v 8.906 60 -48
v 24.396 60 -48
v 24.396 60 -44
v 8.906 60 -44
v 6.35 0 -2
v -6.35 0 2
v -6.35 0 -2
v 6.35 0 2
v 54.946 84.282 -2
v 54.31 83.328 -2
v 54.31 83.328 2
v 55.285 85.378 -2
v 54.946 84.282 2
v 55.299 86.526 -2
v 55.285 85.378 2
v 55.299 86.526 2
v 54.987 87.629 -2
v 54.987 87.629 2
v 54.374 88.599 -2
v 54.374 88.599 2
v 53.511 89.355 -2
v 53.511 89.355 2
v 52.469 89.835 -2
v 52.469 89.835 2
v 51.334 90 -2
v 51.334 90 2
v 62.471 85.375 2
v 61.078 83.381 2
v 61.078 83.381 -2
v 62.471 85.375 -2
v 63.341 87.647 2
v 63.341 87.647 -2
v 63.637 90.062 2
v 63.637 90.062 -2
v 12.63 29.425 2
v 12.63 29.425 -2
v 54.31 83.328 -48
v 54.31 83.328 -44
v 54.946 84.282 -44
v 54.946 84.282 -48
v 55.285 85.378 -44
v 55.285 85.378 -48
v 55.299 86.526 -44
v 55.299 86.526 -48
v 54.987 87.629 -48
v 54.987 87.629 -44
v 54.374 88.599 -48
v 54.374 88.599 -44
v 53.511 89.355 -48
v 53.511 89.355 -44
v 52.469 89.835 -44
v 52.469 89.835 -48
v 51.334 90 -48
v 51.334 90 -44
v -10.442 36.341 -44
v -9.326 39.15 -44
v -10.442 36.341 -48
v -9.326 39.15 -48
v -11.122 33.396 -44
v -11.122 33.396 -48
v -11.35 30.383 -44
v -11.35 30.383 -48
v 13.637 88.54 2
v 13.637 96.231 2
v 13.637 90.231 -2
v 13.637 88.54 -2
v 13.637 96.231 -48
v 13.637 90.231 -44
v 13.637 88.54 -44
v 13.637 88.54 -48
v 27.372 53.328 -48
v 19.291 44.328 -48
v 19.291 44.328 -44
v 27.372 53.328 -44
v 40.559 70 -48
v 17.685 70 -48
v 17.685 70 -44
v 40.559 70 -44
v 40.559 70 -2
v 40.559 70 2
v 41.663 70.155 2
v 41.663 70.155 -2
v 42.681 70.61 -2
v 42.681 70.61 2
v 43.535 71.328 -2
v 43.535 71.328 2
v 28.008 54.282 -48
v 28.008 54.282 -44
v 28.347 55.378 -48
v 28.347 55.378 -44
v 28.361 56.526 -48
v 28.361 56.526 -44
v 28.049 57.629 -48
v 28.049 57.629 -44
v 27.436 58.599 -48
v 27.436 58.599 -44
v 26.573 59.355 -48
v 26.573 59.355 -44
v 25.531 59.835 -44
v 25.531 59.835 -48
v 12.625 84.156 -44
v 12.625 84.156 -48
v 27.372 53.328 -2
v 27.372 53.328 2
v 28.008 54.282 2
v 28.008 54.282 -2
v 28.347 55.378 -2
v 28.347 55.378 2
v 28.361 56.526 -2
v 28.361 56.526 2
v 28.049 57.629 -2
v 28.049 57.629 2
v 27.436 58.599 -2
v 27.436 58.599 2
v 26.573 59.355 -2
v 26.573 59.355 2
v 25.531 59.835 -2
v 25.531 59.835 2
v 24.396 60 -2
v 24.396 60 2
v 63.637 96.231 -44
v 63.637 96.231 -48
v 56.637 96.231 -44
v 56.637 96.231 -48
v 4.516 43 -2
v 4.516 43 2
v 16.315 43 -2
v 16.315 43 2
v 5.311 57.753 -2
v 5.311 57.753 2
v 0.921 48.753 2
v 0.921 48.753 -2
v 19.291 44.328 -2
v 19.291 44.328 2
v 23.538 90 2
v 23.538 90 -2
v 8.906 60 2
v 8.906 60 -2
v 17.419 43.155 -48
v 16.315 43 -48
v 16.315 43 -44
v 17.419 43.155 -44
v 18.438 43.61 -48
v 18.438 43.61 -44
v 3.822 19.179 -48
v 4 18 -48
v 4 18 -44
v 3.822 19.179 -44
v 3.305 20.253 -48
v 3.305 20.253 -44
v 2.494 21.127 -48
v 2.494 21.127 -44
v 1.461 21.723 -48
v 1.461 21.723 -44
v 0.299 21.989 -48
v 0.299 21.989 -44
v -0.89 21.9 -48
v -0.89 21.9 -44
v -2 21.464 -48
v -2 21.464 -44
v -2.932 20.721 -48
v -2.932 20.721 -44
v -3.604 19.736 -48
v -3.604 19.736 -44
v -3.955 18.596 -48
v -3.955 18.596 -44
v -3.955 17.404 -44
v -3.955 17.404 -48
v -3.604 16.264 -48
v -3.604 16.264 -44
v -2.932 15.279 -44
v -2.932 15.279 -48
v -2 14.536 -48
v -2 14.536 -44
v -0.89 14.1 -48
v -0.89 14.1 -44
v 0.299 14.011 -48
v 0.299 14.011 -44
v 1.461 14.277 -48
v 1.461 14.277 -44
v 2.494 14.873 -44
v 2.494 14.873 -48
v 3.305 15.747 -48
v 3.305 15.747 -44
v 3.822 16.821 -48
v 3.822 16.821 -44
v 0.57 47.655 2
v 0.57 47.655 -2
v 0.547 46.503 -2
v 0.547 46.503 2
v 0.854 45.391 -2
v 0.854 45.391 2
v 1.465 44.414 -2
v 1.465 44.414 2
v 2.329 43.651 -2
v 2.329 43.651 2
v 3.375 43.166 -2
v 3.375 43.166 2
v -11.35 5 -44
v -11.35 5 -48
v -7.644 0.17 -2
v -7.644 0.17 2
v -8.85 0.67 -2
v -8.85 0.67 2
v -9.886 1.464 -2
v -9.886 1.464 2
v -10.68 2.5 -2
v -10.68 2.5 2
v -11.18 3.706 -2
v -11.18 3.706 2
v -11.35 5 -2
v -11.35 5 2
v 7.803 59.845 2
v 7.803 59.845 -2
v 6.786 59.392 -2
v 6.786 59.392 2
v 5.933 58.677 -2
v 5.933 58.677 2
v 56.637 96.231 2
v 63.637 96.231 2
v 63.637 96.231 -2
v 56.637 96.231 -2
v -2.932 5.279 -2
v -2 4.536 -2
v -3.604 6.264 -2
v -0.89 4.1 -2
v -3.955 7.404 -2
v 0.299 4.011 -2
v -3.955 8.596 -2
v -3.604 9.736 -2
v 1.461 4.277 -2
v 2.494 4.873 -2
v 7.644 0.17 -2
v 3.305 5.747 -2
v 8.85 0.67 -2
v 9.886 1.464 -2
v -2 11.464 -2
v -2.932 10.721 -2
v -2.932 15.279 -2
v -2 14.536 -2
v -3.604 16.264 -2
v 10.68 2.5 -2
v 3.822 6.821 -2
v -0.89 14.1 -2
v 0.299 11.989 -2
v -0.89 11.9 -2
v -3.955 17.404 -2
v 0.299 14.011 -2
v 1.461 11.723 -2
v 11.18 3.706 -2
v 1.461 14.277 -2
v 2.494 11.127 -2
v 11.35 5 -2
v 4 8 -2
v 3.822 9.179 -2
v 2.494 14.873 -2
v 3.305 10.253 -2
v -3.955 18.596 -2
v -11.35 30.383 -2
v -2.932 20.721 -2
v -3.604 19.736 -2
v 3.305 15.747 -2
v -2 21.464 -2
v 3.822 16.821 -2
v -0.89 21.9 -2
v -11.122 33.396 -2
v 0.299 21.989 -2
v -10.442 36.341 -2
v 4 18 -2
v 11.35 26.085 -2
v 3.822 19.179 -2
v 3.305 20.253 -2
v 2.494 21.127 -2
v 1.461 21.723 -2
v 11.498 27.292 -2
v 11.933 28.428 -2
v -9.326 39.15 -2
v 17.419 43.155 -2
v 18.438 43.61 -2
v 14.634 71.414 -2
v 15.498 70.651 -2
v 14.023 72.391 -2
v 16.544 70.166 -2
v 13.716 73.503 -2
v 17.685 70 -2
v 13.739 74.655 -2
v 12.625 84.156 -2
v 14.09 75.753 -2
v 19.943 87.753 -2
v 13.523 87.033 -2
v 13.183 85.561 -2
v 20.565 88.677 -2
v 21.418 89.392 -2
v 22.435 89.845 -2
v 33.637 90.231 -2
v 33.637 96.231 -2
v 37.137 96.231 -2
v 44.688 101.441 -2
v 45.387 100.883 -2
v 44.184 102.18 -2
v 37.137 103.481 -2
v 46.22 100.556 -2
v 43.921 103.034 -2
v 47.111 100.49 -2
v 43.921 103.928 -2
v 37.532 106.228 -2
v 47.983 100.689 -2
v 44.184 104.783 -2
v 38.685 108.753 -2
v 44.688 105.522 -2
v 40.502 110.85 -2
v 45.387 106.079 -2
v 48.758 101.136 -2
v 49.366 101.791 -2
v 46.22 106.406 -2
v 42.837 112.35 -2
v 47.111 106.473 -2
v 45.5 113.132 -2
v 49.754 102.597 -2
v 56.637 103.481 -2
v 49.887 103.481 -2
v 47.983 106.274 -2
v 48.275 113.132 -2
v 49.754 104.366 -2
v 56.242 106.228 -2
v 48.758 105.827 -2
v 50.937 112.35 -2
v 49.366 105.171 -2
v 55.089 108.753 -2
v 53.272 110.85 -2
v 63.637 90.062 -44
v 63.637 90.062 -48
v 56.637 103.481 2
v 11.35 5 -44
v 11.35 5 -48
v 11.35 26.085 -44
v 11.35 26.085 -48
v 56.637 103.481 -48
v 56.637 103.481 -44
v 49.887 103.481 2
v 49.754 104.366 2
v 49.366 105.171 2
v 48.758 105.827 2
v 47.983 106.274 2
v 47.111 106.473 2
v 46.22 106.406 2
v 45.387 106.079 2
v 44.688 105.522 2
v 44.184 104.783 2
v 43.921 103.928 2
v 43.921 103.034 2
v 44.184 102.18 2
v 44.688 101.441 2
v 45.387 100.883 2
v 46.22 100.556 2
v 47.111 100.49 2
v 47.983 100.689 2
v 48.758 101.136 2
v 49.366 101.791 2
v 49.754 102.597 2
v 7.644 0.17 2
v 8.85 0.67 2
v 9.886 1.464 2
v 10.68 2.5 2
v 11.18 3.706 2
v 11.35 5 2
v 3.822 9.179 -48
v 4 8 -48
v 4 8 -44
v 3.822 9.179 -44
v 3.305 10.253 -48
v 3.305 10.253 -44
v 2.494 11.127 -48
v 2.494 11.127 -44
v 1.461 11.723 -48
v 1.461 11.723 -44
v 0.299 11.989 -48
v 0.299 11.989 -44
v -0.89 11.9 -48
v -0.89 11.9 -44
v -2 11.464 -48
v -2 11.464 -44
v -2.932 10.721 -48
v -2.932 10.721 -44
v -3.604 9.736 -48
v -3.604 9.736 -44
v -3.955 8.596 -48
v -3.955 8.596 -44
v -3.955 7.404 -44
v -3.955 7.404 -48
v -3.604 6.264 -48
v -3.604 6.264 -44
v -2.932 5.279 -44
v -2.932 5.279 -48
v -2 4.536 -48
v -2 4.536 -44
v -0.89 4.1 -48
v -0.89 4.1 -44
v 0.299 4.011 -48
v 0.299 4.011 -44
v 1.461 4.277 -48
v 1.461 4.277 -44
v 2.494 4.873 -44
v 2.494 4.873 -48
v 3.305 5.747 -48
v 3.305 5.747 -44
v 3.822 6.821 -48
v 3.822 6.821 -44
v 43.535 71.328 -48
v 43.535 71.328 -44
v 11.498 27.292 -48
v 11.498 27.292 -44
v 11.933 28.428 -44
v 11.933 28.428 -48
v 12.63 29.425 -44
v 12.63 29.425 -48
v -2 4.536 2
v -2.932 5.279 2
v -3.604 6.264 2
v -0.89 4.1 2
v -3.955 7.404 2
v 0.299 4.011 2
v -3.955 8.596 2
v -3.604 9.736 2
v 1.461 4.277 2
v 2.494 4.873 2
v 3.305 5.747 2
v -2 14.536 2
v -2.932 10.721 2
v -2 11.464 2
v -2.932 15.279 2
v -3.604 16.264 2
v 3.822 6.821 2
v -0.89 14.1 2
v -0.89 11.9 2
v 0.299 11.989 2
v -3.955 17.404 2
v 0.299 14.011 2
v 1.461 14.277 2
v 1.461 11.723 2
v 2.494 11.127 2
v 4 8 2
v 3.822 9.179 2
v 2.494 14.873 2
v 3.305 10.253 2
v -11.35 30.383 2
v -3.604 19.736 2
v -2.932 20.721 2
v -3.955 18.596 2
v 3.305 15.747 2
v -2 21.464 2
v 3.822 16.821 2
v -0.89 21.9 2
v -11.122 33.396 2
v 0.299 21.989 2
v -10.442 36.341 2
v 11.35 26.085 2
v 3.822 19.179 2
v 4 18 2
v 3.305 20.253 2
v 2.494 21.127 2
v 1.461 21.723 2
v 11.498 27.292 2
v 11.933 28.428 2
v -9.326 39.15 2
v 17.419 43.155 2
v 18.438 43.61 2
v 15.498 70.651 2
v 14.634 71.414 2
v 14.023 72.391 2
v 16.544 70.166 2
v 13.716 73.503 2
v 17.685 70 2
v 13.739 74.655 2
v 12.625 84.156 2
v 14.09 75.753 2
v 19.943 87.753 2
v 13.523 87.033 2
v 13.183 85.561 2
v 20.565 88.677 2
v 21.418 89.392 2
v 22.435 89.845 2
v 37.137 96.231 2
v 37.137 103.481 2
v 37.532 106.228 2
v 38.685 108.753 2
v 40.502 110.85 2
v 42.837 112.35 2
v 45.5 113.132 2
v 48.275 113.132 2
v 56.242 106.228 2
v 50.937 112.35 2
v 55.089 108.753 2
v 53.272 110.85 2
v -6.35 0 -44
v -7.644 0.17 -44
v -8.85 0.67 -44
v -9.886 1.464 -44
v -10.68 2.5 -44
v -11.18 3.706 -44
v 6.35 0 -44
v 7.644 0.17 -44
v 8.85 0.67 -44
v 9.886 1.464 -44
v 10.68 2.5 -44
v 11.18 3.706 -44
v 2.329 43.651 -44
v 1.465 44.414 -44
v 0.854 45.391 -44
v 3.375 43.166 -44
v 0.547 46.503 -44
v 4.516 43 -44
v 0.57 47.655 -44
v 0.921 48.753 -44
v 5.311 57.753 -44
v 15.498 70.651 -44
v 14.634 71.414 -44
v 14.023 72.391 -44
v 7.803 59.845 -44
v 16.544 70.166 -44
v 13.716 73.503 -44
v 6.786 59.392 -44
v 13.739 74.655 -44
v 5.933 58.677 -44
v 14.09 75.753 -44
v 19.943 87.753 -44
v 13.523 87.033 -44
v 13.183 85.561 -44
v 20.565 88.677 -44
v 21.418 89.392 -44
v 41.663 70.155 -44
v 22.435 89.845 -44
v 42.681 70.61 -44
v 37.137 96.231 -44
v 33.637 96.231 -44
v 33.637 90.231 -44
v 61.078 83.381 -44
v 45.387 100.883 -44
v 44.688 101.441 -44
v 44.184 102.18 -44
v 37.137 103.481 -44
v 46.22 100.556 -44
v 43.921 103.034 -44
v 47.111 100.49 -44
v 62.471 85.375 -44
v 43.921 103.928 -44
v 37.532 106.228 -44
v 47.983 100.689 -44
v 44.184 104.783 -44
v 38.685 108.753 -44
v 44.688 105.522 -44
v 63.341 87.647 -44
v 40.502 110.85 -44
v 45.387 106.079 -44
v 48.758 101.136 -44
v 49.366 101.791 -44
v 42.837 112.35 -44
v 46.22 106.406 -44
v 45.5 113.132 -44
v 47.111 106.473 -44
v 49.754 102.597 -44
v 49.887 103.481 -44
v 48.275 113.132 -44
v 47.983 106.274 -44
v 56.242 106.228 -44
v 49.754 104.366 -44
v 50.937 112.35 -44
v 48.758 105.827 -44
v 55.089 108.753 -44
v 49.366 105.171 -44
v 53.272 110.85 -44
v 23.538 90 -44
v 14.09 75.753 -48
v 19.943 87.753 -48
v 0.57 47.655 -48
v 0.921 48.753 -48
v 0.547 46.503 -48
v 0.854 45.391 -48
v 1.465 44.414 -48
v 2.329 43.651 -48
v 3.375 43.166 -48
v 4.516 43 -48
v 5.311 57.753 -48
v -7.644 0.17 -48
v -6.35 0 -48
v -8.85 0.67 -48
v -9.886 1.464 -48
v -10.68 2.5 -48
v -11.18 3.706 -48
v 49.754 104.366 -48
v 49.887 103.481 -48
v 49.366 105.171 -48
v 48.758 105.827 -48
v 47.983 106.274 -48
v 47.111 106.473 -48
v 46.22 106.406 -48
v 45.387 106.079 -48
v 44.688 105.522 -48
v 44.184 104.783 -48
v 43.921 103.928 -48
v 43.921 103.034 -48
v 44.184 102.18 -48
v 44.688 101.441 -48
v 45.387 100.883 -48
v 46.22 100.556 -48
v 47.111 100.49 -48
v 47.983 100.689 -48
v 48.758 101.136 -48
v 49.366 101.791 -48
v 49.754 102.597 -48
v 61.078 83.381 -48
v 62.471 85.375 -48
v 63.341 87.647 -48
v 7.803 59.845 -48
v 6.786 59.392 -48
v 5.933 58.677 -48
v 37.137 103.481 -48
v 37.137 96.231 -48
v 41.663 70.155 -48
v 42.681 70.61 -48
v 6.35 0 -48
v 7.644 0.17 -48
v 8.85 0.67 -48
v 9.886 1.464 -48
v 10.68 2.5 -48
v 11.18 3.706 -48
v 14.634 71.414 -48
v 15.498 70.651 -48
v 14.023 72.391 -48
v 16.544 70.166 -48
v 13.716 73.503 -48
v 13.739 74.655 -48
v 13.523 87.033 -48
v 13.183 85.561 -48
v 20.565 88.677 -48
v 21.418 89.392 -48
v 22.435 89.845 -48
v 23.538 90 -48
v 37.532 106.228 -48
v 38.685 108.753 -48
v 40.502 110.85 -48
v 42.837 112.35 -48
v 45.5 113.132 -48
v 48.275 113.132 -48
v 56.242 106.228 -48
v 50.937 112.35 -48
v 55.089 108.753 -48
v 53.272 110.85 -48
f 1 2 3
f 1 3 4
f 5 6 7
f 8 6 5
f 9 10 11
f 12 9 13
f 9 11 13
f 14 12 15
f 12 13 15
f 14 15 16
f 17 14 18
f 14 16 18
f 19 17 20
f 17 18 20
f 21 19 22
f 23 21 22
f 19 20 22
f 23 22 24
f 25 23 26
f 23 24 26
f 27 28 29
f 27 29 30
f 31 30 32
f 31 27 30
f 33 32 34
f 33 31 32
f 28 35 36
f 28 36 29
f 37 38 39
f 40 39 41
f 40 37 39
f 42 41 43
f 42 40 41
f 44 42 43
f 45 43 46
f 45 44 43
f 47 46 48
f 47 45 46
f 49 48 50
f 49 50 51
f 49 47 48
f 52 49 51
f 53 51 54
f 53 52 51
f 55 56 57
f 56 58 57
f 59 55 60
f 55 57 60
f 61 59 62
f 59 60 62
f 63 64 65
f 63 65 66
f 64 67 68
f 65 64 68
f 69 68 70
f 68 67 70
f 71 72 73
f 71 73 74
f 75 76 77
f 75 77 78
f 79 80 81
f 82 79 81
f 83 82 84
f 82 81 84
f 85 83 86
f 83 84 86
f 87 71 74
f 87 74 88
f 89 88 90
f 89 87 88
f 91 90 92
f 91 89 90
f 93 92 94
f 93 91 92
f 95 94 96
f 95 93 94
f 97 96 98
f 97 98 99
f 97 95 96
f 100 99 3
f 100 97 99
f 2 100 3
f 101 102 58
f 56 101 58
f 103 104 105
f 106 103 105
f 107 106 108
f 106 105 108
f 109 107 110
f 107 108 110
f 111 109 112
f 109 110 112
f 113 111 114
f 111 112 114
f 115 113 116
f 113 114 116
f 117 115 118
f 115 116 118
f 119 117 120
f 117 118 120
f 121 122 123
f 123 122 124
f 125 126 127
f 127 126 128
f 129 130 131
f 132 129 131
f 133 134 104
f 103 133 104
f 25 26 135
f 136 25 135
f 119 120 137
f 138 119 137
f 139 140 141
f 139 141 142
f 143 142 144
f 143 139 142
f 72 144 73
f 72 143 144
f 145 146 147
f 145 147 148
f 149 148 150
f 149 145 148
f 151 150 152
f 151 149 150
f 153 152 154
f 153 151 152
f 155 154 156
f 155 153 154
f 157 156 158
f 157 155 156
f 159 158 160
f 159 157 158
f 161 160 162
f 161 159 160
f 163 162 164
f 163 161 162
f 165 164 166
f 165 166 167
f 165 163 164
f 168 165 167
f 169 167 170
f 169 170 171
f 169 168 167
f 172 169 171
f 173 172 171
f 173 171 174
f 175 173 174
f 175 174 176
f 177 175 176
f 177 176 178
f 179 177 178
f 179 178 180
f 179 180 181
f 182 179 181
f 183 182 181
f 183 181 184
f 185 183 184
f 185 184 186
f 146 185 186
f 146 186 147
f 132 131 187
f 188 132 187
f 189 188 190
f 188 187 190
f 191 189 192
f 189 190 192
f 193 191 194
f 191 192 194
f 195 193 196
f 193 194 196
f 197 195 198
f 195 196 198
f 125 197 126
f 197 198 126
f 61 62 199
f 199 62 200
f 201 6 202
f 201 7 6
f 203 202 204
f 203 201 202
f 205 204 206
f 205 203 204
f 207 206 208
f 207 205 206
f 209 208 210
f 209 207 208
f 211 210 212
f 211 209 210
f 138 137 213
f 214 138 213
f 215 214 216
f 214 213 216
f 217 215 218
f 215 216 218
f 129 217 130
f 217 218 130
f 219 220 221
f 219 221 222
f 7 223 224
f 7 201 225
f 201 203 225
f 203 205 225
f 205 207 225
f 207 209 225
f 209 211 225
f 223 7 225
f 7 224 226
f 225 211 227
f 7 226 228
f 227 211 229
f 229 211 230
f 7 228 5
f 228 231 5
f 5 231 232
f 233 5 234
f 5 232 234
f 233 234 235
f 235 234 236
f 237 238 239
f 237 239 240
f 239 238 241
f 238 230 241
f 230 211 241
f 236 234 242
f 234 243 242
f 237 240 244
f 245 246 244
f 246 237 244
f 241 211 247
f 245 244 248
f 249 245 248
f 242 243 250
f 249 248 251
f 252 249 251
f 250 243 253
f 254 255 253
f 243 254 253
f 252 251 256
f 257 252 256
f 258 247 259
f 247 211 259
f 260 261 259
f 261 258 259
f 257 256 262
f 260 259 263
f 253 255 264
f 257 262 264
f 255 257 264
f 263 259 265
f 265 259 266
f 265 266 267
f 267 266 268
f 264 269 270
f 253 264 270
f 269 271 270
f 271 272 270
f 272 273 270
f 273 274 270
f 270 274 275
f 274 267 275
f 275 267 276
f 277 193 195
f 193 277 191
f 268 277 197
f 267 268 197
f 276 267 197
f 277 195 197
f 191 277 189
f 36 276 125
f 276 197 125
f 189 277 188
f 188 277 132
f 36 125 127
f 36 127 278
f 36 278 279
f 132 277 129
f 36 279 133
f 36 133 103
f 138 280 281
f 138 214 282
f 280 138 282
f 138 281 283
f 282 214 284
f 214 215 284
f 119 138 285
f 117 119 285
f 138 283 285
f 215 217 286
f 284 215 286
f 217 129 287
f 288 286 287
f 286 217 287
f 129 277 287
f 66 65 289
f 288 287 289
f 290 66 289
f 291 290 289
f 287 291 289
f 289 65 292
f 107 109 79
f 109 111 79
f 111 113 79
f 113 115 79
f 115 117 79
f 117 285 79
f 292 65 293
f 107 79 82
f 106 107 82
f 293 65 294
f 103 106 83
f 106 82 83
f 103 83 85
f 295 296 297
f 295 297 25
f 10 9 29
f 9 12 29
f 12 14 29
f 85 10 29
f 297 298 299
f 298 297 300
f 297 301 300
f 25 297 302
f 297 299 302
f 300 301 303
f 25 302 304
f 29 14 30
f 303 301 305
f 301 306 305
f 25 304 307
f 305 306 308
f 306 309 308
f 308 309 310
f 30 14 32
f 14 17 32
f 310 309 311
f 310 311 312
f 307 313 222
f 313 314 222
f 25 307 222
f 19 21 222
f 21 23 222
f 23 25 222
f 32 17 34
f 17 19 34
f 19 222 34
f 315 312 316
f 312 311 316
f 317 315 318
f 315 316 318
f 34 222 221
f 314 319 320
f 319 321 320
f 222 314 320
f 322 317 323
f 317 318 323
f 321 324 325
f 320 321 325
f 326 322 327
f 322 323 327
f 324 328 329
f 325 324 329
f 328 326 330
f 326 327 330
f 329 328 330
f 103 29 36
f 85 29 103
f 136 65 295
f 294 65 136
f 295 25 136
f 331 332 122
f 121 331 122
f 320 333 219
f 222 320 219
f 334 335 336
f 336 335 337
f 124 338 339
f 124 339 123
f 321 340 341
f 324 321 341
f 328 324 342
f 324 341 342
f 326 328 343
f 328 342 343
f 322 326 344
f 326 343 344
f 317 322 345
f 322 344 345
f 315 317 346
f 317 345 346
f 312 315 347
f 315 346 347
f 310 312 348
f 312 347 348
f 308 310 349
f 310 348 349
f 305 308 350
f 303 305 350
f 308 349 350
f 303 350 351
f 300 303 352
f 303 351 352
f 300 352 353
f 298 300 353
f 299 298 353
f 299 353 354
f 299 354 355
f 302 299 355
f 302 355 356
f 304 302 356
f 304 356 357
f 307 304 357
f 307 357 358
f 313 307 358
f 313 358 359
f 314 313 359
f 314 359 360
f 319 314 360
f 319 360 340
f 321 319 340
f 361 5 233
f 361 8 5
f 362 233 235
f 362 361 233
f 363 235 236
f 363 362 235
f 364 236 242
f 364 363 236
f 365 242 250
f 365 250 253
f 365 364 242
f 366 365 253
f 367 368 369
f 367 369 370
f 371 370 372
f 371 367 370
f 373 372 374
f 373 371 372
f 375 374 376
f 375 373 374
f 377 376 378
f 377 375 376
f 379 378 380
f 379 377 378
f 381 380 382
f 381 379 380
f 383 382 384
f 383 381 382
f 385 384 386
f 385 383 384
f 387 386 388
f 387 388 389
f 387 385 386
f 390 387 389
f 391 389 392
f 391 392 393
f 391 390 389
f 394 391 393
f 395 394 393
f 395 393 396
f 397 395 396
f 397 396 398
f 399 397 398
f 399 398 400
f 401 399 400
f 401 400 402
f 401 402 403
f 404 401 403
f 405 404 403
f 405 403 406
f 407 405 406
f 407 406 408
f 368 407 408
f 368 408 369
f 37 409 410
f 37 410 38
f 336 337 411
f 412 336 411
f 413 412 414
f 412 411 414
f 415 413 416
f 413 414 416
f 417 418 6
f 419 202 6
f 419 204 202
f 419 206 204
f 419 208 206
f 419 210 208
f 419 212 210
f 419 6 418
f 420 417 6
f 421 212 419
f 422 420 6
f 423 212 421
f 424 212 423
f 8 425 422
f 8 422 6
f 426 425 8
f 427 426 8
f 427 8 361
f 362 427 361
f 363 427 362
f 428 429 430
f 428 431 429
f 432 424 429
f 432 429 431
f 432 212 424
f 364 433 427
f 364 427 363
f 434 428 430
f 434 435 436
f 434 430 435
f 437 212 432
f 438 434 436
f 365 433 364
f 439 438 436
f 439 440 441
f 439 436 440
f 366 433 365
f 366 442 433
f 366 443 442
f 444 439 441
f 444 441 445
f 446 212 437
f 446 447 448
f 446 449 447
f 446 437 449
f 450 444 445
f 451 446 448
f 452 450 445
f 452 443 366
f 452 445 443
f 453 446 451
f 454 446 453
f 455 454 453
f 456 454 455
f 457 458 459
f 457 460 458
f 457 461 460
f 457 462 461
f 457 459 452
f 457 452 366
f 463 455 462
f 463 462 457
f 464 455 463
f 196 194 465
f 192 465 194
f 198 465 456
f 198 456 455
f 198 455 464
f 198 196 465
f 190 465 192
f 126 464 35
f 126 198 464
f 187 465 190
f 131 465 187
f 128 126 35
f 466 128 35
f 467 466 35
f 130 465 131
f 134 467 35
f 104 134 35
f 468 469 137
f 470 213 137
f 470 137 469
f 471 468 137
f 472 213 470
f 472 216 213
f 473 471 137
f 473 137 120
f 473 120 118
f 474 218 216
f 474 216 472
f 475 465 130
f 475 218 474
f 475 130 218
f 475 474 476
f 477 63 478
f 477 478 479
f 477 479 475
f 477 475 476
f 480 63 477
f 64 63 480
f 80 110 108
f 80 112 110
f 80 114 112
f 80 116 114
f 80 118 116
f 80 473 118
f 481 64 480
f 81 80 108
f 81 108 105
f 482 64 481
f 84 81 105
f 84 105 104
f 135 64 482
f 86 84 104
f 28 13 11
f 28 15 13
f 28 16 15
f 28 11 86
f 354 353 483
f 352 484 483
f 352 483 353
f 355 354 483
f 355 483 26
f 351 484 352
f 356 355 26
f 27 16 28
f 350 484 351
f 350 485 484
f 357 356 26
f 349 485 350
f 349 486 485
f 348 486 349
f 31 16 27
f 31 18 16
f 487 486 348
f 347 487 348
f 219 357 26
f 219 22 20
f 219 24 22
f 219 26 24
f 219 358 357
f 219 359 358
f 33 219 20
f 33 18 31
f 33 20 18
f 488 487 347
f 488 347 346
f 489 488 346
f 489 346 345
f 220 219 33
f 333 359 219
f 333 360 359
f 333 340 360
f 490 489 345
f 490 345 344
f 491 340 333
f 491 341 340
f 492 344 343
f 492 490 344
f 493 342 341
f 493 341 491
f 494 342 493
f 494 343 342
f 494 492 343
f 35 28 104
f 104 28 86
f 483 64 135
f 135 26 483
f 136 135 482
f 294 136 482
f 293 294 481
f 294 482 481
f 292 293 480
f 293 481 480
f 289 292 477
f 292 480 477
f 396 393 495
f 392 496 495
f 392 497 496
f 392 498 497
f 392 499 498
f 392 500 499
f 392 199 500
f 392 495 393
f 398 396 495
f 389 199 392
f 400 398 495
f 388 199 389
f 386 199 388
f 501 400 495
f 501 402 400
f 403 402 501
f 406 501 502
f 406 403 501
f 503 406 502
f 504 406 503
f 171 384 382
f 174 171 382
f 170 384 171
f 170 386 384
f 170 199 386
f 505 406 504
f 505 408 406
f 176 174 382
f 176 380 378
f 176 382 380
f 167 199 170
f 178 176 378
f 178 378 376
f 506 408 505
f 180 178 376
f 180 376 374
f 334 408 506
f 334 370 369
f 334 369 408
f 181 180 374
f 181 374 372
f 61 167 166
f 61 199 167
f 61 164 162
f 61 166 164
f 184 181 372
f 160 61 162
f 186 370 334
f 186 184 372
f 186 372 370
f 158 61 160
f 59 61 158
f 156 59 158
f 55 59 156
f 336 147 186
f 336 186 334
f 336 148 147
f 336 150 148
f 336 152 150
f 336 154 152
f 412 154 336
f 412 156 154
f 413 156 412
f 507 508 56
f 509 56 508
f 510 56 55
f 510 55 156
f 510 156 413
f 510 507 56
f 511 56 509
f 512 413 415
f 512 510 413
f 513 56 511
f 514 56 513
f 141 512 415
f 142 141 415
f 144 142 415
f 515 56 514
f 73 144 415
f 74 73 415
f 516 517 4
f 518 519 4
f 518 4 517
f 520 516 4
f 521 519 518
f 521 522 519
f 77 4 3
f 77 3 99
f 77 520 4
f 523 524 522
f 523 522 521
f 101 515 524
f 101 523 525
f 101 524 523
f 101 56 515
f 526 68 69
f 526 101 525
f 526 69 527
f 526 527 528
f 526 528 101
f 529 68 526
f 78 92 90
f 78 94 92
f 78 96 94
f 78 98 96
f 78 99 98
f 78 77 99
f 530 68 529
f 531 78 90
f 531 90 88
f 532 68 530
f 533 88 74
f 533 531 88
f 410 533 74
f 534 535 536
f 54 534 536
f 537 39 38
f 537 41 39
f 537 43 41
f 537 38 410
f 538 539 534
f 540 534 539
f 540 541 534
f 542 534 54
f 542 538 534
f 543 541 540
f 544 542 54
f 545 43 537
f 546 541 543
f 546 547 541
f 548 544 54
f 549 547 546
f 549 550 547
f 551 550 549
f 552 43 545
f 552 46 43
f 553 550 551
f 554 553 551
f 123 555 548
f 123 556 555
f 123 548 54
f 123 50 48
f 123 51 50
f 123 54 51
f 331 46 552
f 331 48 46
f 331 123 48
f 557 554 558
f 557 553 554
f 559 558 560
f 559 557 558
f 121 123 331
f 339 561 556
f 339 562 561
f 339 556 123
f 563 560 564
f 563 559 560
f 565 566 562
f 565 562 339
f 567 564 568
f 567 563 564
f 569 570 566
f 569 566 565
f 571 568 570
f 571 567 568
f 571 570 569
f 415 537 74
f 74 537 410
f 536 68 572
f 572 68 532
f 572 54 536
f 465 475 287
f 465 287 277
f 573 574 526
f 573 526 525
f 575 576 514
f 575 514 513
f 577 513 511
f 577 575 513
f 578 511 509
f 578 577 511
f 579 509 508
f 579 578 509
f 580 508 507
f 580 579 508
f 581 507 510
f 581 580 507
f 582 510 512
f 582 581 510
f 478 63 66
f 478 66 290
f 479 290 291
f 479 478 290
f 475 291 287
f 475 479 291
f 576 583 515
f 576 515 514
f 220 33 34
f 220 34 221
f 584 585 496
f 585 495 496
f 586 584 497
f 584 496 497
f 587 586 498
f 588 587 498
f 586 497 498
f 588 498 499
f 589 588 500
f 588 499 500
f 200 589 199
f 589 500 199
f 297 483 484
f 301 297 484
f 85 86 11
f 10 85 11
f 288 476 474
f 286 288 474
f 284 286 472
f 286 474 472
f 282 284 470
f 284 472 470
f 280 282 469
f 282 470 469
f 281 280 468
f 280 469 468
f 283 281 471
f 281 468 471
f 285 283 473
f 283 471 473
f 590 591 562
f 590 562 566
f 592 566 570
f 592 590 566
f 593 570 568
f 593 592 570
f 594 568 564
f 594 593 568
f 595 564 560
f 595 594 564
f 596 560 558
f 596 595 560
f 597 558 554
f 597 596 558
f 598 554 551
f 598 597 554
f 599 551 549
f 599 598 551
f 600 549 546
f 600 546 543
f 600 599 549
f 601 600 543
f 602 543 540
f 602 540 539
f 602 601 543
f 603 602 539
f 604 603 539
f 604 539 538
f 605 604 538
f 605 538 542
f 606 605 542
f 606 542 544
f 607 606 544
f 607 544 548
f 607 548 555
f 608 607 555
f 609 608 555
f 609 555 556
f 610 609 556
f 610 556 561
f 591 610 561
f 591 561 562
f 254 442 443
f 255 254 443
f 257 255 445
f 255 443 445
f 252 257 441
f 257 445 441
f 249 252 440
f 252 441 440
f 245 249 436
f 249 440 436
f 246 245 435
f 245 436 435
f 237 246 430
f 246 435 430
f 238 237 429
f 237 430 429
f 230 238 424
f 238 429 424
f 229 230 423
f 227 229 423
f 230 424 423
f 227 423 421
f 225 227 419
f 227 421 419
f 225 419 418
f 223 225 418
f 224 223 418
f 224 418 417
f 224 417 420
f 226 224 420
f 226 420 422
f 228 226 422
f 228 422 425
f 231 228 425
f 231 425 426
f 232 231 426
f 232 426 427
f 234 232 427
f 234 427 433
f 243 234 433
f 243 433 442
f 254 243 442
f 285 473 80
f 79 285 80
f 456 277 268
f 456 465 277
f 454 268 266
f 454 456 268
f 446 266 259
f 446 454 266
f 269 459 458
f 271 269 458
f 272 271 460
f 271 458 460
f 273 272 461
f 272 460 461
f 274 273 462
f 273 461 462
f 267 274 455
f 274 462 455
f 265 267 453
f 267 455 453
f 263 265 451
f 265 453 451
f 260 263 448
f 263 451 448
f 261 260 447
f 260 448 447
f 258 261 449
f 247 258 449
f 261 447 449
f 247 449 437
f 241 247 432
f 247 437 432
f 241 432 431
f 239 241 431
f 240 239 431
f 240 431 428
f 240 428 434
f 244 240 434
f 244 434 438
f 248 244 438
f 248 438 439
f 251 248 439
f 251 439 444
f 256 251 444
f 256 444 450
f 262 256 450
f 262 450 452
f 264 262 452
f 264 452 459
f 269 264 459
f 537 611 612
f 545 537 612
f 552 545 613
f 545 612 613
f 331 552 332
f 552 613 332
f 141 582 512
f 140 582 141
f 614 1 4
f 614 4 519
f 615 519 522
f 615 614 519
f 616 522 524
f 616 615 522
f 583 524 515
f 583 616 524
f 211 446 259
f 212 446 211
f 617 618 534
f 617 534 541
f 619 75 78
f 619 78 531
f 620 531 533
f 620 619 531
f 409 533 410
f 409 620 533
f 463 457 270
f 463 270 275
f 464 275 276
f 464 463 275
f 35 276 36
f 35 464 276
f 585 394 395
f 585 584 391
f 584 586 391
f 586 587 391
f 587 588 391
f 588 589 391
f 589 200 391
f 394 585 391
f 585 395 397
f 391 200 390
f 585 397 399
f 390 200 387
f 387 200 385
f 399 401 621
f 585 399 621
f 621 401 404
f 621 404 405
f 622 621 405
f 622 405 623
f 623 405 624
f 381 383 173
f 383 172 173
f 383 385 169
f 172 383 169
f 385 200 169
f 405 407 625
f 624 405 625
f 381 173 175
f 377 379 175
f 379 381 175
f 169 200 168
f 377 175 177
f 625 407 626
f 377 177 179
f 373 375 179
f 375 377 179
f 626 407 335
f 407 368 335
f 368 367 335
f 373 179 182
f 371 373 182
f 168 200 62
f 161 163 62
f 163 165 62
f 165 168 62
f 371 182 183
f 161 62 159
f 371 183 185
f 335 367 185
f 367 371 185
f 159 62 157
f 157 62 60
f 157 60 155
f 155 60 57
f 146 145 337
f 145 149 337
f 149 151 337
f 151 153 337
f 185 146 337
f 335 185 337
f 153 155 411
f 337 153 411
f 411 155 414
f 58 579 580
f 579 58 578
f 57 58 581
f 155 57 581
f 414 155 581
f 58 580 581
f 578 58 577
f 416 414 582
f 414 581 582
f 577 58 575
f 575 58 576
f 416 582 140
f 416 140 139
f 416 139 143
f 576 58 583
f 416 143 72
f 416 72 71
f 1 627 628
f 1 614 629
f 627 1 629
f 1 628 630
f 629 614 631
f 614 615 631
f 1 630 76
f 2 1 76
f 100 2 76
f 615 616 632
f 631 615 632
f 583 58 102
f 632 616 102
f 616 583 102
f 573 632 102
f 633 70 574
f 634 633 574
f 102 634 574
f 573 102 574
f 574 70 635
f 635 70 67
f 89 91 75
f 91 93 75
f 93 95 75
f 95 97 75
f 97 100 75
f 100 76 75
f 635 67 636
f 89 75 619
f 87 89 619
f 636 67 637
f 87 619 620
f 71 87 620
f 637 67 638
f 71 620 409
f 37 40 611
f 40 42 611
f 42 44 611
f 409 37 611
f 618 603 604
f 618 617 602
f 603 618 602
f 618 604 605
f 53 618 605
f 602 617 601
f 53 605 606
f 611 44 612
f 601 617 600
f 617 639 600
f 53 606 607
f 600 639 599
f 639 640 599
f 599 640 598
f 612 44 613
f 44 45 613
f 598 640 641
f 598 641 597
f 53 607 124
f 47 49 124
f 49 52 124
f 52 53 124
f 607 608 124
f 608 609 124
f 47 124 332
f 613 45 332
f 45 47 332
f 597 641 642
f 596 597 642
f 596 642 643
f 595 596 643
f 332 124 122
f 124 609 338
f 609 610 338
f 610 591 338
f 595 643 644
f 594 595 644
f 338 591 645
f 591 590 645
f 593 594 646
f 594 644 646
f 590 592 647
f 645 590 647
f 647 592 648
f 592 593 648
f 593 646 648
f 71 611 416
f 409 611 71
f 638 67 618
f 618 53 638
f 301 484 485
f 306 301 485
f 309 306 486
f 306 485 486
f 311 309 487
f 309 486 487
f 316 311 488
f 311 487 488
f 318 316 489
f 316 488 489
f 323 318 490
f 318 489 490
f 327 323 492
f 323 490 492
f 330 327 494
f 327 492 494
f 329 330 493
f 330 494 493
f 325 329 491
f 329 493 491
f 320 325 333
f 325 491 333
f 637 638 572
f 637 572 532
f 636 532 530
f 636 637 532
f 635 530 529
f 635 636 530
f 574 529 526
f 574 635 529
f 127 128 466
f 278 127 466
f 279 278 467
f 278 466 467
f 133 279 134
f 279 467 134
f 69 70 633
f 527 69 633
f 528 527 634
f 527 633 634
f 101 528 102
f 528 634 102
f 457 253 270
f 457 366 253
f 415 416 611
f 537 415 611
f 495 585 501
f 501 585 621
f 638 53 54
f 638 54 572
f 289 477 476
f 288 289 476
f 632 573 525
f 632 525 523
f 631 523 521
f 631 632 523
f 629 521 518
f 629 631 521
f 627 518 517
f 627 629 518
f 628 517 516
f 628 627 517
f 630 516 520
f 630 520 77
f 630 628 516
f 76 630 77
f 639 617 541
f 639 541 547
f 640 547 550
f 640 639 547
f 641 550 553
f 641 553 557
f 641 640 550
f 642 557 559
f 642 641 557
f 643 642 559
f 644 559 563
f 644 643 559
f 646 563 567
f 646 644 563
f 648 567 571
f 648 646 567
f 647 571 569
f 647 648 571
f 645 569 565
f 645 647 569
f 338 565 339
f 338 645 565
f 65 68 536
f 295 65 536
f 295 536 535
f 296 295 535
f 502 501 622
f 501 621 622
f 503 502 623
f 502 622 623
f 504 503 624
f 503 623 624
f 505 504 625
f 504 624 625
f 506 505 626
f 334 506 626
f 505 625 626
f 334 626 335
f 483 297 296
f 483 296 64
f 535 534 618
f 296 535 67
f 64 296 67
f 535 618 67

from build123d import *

# Parameters (mm, degrees)
RESSALTO_EXTRUS_O1_DEPTH = 2
FILETE1_R                = 5
ESBO_O2_R                = 4
CORTE_EXTRUS_O1_DEPTH    = 116.438914874
CORTE_EXTRUS_O2_DEPTH    = 116.438914874
RESSALTO_EXTRUS_O2_DEPTH = 4
ESBO_O5_R                = 3
CORTE_EXTRUS_O3_DEPTH    = 130.950013194
ESBO_O6_W                = 20
ESBO_O6_H                = 6
RESSALTO_EXTRUS_O3_DEPTH = 25


with BuildPart() as part:
    # Esboço1 → Ressalto-extrusão1 (new, symmetric)
    with BuildSketch(Plane.XY):
        with BuildLine():
            Line((-11.35, 0), (11.35, 0))
            Line((11.35, 0), (11.35, 26.084614768))
            ThreePointArc((11.35, 26.084614768), (11.680869588, 27.873251455), (12.62968848, 29.425165949))
            Line((12.62968848, 29.425165949), (61.077778408, 83.380928741))
            ThreePointArc((61.077778408, 83.380928741), (62.97541619, 86.484757728), (63.637155367, 90.062031103))
            Line((63.637155367, 90.062031103), (63.637155367, 96.231260639))
            Line((63.637155367, 96.231260639), (13.637155367, 96.231260639))
            Line((13.637155367, 96.231260639), (13.637155367, 88.53994255))
            ThreePointArc((13.637155367, 88.53994255), (13.380856015, 86.290432007), (12.62509583, 84.156231082))
            Line((12.62509583, 84.156231082), (-9.325880926, 39.150059113))
            ThreePointArc((-9.325880926, 39.150059113), (-10.837401296, 34.881657264), (-11.35, 30.382636177))
            Line((-11.35, 30.382636177), (-11.35, 0))
        make_face()
    extrude(amount=RESSALTO_EXTRUS_O1_DEPTH, both=True)

    # Filete1
    filete1_edges = [part.edges().sort_by_distance(p)[0] for p in [
        (11.35, 0, 0),
        (-11.35, 0, 0),
    ]]
    fillet(filete1_edges, radius=FILETE1_R)

    # Esboço2 → Corte-extrusão1 (cut, through all)
    with BuildSketch(Plane.XY.offset(2)):
        with Locations((0, 8)):
            Circle(ESBO_O2_R)
        with Locations((0, 18)):
            Circle(ESBO_O2_R)
    extrude(amount=-CORTE_EXTRUS_O1_DEPTH, mode=Mode.SUBTRACT)

    # Esboço3 → Corte-extrusão2 (cut, through all)
    with BuildSketch(Plane.XY.offset(2)):
        with BuildLine():
            Line((4.516208527, 43), (16.314765002, 43))
            ThreePointArc((16.314765002, 43), (17.944218319, 43.346935274), (19.291014218, 44.327559055))
            Line((19.291014218, 44.327559055), (27.372316137, 53.327559055))
            ThreePointArc((27.372316137, 53.327559055), (28.049131646, 57.629453317), (24.39606692, 60))
            Line((24.39606692, 60), (8.905801824, 60))
            ThreePointArc((8.905801824, 60), (6.786124767, 59.392192385), (5.310625639, 57.753484587))
            Line((5.310625639, 57.753484587), (0.921032342, 48.753484587))
            ThreePointArc((0.921032342, 48.753484587), (1.124016142, 44.880322943), (4.516208527, 43))
        make_face()
        with BuildLine():
            Line((51.333739981, 90), (23.537779481, 90))
            ThreePointArc((23.537779481, 90), (21.418102424, 89.392192385), (19.942603296, 87.753484587))
            Line((19.942603296, 87.753484587), (14.089812233, 75.753484587))
            ThreePointArc((14.089812233, 75.753484587), (14.292796034, 71.880322943), (17.684988418, 70))
            Line((17.684988418, 70), (40.558670757, 70))
            ThreePointArc((40.558670757, 70), (42.188124073, 70.346935274), (43.534919973, 71.327559055))
            Line((43.534919973, 71.327559055), (54.309989197, 83.327559055))
            ThreePointArc((54.309989197, 83.327559055), (54.986804707, 87.629453317), (51.333739981, 90))
        make_face()
    extrude(amount=-CORTE_EXTRUS_O2_DEPTH, mode=Mode.SUBTRACT)

    # Esboço4 → Ressalto-extrusão2 (add)
    with BuildSketch(Plane.XY.offset(2)):
        with BuildLine():
            Line((37.137155367, 96.231260639), (37.137155367, 103.481260639))
            ThreePointArc((37.137155367, 103.481260639), (46.887155367, 113.231260639), (56.637155367, 103.481260639))
            Line((56.637155367, 103.481260639), (56.637155367, 96.231260639))
            Line((56.637155367, 96.231260639), (37.137155367, 96.231260639))
        make_face()
    extrude(amount=-RESSALTO_EXTRUS_O2_DEPTH)

    # Esboço5 → Corte-extrusão3 (cut, through all)
    with BuildSketch(Plane.XY.offset(2)):
        with Locations((46.887155367, 103.481260639)):
            Circle(ESBO_O5_R)
    extrude(amount=-CORTE_EXTRUS_O3_DEPTH, mode=Mode.SUBTRACT)

    # Esboço6 → Ressalto-extrusão3 (add)
    with BuildSketch(Plane.XY.offset(2)):
        with Locations((23.637155367, 93.231260639)):
            Rectangle(ESBO_O6_W, ESBO_O6_H)
    extrude(amount=-RESSALTO_EXTRUS_O3_DEPTH)

    # Espelhar5: part across plane


with BuildPart() as part_1:
    add(part.part)
    add(part.part.mirror(Plane.XY.offset(-23)))


solid = part_1.part
